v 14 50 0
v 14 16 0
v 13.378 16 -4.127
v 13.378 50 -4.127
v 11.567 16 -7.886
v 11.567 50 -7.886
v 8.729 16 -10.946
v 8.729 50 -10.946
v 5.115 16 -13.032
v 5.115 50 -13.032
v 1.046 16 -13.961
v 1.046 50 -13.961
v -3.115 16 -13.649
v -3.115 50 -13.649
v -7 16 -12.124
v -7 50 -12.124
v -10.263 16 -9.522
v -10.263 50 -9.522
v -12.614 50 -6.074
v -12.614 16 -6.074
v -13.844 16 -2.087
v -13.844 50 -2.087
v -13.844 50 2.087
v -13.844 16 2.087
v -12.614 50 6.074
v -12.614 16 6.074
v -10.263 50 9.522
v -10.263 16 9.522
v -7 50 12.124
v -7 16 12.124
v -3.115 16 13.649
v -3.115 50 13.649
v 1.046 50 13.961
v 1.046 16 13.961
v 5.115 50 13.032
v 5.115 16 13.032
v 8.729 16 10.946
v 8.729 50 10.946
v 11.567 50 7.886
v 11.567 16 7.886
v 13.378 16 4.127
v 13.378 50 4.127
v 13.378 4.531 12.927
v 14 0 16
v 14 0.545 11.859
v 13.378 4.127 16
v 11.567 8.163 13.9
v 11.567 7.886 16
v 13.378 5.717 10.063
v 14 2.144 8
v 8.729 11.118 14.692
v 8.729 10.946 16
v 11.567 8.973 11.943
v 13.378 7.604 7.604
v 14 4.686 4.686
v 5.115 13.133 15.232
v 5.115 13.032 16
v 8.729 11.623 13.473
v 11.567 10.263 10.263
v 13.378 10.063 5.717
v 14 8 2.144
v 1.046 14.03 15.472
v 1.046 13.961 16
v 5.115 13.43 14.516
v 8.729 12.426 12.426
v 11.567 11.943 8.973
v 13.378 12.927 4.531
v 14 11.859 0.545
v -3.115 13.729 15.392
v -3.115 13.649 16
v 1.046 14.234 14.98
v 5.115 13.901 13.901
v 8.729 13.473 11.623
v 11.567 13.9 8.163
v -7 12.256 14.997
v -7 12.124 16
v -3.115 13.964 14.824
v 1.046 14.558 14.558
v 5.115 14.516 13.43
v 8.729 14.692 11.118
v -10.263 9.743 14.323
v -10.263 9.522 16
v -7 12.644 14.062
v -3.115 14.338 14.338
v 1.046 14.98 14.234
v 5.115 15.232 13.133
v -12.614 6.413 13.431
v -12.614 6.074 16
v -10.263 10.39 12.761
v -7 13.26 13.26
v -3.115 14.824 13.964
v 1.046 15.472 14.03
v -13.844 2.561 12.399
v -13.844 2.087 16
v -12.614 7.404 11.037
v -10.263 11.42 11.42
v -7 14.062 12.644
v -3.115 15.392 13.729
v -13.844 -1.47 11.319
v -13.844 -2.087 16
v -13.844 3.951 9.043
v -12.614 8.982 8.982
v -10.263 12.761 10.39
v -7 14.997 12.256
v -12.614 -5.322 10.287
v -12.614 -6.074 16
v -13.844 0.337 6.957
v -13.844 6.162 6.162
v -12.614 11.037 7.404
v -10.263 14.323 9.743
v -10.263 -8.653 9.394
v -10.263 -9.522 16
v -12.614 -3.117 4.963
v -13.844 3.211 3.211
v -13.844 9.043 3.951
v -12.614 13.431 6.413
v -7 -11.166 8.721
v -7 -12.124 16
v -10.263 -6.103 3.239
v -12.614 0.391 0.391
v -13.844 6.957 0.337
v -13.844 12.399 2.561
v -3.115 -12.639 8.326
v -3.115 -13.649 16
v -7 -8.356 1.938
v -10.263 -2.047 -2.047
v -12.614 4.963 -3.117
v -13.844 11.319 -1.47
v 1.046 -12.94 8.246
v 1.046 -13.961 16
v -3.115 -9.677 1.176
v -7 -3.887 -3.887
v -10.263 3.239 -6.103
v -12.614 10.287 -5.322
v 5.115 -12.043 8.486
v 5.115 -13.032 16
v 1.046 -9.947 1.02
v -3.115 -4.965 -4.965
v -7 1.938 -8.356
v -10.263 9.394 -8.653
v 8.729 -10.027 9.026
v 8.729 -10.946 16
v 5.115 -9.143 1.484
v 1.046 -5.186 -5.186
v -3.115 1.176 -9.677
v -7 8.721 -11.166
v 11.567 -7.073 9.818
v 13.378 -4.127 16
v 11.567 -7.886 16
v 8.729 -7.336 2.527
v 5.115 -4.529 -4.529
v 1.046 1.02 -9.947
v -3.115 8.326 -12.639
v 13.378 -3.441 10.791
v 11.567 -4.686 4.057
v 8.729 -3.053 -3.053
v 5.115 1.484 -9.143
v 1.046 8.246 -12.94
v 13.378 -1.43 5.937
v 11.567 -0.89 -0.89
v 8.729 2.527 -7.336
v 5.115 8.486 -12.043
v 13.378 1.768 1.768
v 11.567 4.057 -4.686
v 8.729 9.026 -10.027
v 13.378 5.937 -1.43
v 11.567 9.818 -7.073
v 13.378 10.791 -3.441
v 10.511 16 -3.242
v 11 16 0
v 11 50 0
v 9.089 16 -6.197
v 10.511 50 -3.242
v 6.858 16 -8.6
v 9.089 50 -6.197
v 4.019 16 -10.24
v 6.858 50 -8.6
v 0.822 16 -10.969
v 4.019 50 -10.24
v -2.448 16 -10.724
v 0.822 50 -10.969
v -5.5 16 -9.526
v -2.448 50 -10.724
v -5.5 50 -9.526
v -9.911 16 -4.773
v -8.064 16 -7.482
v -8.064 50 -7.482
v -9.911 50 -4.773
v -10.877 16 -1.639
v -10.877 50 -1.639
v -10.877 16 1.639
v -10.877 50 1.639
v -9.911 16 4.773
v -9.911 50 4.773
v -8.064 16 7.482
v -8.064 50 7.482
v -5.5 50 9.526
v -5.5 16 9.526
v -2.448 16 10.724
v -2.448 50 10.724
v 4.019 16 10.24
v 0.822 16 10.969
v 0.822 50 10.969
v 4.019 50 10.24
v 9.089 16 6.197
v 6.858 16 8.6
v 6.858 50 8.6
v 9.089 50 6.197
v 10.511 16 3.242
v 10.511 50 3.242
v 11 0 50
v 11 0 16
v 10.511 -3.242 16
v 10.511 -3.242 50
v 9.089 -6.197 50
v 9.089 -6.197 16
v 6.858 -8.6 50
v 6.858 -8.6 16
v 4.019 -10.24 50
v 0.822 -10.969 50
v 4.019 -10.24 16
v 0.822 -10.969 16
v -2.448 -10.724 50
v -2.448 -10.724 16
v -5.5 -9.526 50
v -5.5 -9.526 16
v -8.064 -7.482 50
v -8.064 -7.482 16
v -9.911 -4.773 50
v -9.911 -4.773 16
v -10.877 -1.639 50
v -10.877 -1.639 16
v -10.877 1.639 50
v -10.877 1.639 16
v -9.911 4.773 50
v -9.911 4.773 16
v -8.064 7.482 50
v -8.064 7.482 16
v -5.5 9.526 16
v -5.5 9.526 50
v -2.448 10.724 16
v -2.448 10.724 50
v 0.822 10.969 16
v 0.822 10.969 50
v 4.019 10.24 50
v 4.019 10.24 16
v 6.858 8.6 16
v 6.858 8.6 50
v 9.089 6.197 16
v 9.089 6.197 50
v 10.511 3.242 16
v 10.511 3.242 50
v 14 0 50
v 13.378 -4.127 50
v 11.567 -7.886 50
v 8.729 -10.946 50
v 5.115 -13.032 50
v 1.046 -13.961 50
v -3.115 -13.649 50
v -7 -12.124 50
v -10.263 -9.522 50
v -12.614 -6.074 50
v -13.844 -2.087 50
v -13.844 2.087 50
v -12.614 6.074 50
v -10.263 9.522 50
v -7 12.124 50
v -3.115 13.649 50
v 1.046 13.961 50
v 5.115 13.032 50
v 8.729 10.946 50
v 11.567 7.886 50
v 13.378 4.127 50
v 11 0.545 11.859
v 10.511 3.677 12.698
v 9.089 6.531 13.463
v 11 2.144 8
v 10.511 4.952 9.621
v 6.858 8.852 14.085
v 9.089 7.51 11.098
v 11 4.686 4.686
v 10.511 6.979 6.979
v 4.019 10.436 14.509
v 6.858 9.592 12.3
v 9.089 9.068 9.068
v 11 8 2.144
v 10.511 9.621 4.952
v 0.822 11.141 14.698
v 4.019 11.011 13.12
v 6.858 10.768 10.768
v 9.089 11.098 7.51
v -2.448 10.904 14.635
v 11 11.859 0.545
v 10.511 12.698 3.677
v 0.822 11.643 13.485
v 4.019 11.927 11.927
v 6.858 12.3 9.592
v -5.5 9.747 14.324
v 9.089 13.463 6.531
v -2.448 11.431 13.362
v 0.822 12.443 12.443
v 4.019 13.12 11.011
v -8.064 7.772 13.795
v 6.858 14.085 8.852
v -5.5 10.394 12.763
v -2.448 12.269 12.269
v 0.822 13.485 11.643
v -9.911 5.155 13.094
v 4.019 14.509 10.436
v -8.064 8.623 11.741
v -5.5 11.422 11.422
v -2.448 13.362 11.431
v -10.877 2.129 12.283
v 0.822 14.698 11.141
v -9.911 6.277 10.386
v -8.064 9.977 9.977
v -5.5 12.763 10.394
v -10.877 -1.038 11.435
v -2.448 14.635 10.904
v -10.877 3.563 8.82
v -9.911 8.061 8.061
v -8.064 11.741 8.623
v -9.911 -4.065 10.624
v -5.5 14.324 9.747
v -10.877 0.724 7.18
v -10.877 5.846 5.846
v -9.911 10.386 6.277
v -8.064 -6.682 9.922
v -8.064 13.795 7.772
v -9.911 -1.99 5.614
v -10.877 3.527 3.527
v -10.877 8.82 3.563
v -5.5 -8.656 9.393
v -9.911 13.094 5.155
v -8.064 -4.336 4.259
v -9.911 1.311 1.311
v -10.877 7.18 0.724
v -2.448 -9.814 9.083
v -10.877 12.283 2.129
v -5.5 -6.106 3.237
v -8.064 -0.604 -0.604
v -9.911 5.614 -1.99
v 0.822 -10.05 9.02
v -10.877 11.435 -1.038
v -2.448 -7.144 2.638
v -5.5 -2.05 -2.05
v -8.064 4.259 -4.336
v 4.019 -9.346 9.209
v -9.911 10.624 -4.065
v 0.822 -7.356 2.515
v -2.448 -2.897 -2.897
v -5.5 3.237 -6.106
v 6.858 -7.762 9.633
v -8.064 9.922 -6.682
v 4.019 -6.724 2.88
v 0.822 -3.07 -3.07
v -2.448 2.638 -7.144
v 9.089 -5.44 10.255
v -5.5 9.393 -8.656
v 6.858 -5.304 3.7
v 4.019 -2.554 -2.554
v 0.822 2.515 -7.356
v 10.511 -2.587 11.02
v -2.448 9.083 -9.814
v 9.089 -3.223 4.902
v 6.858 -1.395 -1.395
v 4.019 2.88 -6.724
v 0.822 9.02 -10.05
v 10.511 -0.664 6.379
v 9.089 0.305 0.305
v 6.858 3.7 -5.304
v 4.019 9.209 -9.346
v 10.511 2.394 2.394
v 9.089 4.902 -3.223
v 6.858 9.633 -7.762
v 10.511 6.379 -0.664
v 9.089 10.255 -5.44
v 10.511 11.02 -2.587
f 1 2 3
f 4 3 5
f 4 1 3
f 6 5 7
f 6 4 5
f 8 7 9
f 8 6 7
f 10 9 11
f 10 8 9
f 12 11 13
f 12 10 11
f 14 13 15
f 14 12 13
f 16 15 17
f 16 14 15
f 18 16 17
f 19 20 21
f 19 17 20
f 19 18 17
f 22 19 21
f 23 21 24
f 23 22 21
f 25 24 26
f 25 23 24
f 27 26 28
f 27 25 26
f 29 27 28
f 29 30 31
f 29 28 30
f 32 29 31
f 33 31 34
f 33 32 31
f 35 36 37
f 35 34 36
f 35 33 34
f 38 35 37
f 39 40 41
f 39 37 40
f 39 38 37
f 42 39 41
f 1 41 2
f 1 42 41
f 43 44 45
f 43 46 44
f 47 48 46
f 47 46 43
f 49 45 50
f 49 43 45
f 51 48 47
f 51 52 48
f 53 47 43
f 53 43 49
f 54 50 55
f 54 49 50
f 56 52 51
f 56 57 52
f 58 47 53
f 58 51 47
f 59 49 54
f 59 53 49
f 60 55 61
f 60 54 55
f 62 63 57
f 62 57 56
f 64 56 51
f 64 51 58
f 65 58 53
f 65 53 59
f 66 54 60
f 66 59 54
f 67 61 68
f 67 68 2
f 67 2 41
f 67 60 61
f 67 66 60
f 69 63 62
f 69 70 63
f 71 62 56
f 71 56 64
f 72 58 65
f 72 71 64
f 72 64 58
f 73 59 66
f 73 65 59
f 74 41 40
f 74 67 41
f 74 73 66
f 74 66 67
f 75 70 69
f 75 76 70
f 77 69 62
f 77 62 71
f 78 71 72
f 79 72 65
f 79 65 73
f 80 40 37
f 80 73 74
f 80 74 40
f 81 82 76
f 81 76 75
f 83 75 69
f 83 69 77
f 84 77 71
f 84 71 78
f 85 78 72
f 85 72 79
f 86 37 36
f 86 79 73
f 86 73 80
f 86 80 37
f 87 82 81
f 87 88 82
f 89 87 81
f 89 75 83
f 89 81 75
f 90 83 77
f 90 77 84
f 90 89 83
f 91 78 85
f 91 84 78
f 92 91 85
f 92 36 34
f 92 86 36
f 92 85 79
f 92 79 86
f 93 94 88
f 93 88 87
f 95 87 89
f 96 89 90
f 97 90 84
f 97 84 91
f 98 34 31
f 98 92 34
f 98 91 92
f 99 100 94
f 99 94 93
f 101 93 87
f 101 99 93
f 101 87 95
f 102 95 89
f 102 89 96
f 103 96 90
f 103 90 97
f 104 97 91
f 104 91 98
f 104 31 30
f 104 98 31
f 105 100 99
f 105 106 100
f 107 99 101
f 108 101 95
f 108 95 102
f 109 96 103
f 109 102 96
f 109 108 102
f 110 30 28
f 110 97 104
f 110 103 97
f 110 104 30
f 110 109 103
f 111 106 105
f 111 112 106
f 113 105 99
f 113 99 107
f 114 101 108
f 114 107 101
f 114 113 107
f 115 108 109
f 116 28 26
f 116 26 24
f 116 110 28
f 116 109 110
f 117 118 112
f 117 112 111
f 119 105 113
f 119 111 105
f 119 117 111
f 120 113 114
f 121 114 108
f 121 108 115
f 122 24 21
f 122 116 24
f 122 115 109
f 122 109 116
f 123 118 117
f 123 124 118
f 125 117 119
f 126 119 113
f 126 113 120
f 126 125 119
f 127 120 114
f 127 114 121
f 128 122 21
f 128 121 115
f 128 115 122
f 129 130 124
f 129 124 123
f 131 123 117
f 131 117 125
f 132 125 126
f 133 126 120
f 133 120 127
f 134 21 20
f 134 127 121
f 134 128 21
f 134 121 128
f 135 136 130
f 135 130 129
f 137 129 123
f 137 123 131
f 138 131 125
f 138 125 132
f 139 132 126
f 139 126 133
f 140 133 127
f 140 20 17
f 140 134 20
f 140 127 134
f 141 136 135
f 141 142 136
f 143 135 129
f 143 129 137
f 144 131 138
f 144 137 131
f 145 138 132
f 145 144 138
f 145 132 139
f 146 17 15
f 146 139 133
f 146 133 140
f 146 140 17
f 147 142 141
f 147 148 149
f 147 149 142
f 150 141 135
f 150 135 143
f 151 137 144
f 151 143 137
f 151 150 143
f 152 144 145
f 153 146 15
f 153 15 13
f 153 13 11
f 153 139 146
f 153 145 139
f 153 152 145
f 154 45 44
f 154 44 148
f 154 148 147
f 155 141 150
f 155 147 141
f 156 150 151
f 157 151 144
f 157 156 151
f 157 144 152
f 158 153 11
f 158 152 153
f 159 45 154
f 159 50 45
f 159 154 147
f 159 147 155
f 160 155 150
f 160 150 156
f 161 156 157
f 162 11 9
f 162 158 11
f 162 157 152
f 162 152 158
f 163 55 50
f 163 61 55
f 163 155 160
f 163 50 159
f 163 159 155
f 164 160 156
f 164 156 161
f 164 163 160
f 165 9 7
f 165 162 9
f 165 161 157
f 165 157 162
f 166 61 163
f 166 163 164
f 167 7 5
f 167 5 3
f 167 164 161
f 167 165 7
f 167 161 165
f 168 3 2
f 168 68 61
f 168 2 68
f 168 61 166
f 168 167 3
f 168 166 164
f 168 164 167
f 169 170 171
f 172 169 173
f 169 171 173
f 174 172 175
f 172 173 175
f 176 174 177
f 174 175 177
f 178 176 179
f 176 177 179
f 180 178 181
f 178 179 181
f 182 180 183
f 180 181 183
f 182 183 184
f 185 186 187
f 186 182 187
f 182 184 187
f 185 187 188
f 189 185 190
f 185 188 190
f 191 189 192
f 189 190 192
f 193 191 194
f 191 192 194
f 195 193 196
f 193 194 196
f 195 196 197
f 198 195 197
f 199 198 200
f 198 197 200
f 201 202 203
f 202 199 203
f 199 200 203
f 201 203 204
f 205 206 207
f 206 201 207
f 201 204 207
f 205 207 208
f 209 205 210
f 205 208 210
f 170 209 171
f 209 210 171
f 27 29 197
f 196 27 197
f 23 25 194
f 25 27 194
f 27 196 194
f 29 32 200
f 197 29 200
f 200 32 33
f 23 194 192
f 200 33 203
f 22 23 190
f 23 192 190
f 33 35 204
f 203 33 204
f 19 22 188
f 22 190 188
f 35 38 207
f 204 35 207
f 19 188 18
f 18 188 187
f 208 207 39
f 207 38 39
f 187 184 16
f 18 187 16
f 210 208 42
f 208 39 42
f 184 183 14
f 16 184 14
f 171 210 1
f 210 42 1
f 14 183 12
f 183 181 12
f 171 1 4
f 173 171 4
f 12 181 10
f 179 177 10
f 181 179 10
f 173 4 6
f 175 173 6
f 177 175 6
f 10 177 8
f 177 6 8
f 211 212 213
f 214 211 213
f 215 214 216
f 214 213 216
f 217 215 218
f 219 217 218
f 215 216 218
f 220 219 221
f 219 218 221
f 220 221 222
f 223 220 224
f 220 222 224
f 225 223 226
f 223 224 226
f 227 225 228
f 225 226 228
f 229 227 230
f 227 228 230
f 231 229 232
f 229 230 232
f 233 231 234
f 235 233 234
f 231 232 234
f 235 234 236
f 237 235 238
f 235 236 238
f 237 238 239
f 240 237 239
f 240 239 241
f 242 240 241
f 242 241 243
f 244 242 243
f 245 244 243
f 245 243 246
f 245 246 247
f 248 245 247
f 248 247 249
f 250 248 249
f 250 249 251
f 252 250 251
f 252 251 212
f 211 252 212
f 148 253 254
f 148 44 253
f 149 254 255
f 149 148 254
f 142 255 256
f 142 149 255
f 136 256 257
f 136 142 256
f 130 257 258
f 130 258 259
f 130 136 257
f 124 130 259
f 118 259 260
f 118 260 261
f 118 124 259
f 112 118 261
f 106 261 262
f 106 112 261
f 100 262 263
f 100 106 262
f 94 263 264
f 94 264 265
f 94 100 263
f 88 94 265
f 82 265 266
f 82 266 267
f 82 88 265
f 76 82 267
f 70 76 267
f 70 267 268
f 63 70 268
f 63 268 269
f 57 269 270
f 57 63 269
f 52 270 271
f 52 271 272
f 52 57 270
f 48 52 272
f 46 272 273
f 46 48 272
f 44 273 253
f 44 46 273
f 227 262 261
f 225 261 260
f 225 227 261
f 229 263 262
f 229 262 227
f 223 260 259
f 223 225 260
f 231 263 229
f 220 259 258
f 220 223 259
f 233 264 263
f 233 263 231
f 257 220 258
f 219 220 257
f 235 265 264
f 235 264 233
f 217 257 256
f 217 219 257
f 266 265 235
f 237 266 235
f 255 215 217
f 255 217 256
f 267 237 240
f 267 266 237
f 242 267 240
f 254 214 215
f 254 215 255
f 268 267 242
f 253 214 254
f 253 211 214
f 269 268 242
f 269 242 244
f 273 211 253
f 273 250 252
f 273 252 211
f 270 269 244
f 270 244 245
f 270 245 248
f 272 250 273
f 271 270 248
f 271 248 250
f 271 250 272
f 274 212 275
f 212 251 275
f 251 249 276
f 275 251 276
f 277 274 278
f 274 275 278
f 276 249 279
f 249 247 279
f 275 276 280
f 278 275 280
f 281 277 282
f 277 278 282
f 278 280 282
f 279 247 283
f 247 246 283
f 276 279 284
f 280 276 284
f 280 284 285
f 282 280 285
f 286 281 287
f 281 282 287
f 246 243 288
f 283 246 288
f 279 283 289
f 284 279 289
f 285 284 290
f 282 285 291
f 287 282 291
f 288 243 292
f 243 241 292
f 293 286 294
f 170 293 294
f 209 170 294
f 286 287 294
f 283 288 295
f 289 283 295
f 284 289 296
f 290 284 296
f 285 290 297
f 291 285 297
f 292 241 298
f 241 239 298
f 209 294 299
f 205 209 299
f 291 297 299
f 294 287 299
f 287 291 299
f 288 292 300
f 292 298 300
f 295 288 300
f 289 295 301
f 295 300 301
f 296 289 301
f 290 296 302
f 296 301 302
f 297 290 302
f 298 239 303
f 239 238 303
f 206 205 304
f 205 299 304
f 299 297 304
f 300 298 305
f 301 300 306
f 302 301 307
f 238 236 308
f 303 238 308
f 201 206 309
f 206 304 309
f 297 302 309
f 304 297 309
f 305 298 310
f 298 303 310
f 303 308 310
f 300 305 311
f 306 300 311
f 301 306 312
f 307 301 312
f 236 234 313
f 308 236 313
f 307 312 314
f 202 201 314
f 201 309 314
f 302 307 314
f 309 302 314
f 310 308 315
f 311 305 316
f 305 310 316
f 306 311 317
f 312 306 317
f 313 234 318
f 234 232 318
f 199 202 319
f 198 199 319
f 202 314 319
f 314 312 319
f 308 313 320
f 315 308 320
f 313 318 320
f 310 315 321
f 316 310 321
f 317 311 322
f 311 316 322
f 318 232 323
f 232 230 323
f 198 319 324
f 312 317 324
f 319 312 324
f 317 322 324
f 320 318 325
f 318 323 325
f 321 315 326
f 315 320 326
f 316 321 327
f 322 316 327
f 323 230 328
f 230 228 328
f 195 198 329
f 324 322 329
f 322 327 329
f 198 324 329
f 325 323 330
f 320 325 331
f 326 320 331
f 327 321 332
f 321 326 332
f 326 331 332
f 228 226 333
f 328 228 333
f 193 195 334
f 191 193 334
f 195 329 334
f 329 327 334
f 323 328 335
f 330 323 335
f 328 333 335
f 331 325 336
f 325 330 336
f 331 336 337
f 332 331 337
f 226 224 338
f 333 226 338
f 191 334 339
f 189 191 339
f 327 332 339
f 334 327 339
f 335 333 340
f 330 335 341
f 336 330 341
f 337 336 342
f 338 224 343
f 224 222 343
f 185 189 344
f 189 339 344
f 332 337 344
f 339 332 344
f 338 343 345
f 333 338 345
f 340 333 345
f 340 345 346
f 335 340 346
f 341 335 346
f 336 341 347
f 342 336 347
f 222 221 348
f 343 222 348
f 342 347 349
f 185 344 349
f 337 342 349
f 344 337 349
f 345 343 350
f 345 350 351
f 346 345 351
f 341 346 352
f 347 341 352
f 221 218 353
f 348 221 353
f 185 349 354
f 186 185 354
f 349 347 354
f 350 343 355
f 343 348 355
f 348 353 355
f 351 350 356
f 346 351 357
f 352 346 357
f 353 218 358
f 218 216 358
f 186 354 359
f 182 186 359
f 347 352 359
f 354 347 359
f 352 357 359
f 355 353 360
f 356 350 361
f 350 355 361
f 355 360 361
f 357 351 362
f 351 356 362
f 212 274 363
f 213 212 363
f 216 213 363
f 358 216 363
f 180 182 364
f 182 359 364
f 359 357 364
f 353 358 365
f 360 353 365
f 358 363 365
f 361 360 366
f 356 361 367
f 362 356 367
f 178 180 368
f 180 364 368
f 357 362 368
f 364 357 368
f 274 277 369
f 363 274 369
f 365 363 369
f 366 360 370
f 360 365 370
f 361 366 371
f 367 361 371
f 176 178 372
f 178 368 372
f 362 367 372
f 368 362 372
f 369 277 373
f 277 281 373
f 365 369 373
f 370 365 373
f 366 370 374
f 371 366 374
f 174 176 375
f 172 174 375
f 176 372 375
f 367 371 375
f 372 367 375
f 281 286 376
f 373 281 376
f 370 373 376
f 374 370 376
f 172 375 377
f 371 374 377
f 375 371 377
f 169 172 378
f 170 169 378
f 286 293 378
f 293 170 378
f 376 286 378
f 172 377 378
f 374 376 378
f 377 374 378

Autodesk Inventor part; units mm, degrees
ref_plane "YZ Plane" through (0, 0, 0) normal (1, 0, 0) x (0, 1, 0)
ref_plane "Work Plane1" through (0, 0, 50) normal (0, 0, 1) x (1, 0, 0)
sketch "Sketch1" plane through (0, 0, 50) normal (0, 0, 1) x (1, 0, 0)
  circle A0 centre (0, 0) radius 14
  dimension "d1" = 28
ref_plane "Work Plane2" through (0, 50, 0) normal (0, 1, 0) x (-1, 0, 0)
sketch "Sketch2" plane through (0, 50, 0) normal (0, 1, 0) x (-1, 0, 0)
  circle A0 centre (0, 0) radius 14
  dimension "d3" = 28
sketch "Sketch3" plane through (0, 0, 0) normal (1, 0, 0) x (0, 1, 0)
  line L0 (50, -14) -> (50, 14) construction
  line L1 (14, 50) -> (-14, 50) construction
  line L2 (50, 0) -> (0, 0)
  line L3 (0, 50) -> (0, 0)
  line L4 (14, 50) -> (14, 16)
  line L5 (16, 14) -> (50, 14)
  arc A0 (14, 16) -> (16, 14) centre (16, 16) ccw
  dimension "d4" = 2
sweep "Sweep1" add profiles "Sketch1" path "Sketch3" path curves L4 A0 L5
shell "Shell1" thickness 3 removed faces 2 at (7.0627, 50, -5.5585) at (0.1834, -3.0946, 50)
properties part number "90º Elbow"
